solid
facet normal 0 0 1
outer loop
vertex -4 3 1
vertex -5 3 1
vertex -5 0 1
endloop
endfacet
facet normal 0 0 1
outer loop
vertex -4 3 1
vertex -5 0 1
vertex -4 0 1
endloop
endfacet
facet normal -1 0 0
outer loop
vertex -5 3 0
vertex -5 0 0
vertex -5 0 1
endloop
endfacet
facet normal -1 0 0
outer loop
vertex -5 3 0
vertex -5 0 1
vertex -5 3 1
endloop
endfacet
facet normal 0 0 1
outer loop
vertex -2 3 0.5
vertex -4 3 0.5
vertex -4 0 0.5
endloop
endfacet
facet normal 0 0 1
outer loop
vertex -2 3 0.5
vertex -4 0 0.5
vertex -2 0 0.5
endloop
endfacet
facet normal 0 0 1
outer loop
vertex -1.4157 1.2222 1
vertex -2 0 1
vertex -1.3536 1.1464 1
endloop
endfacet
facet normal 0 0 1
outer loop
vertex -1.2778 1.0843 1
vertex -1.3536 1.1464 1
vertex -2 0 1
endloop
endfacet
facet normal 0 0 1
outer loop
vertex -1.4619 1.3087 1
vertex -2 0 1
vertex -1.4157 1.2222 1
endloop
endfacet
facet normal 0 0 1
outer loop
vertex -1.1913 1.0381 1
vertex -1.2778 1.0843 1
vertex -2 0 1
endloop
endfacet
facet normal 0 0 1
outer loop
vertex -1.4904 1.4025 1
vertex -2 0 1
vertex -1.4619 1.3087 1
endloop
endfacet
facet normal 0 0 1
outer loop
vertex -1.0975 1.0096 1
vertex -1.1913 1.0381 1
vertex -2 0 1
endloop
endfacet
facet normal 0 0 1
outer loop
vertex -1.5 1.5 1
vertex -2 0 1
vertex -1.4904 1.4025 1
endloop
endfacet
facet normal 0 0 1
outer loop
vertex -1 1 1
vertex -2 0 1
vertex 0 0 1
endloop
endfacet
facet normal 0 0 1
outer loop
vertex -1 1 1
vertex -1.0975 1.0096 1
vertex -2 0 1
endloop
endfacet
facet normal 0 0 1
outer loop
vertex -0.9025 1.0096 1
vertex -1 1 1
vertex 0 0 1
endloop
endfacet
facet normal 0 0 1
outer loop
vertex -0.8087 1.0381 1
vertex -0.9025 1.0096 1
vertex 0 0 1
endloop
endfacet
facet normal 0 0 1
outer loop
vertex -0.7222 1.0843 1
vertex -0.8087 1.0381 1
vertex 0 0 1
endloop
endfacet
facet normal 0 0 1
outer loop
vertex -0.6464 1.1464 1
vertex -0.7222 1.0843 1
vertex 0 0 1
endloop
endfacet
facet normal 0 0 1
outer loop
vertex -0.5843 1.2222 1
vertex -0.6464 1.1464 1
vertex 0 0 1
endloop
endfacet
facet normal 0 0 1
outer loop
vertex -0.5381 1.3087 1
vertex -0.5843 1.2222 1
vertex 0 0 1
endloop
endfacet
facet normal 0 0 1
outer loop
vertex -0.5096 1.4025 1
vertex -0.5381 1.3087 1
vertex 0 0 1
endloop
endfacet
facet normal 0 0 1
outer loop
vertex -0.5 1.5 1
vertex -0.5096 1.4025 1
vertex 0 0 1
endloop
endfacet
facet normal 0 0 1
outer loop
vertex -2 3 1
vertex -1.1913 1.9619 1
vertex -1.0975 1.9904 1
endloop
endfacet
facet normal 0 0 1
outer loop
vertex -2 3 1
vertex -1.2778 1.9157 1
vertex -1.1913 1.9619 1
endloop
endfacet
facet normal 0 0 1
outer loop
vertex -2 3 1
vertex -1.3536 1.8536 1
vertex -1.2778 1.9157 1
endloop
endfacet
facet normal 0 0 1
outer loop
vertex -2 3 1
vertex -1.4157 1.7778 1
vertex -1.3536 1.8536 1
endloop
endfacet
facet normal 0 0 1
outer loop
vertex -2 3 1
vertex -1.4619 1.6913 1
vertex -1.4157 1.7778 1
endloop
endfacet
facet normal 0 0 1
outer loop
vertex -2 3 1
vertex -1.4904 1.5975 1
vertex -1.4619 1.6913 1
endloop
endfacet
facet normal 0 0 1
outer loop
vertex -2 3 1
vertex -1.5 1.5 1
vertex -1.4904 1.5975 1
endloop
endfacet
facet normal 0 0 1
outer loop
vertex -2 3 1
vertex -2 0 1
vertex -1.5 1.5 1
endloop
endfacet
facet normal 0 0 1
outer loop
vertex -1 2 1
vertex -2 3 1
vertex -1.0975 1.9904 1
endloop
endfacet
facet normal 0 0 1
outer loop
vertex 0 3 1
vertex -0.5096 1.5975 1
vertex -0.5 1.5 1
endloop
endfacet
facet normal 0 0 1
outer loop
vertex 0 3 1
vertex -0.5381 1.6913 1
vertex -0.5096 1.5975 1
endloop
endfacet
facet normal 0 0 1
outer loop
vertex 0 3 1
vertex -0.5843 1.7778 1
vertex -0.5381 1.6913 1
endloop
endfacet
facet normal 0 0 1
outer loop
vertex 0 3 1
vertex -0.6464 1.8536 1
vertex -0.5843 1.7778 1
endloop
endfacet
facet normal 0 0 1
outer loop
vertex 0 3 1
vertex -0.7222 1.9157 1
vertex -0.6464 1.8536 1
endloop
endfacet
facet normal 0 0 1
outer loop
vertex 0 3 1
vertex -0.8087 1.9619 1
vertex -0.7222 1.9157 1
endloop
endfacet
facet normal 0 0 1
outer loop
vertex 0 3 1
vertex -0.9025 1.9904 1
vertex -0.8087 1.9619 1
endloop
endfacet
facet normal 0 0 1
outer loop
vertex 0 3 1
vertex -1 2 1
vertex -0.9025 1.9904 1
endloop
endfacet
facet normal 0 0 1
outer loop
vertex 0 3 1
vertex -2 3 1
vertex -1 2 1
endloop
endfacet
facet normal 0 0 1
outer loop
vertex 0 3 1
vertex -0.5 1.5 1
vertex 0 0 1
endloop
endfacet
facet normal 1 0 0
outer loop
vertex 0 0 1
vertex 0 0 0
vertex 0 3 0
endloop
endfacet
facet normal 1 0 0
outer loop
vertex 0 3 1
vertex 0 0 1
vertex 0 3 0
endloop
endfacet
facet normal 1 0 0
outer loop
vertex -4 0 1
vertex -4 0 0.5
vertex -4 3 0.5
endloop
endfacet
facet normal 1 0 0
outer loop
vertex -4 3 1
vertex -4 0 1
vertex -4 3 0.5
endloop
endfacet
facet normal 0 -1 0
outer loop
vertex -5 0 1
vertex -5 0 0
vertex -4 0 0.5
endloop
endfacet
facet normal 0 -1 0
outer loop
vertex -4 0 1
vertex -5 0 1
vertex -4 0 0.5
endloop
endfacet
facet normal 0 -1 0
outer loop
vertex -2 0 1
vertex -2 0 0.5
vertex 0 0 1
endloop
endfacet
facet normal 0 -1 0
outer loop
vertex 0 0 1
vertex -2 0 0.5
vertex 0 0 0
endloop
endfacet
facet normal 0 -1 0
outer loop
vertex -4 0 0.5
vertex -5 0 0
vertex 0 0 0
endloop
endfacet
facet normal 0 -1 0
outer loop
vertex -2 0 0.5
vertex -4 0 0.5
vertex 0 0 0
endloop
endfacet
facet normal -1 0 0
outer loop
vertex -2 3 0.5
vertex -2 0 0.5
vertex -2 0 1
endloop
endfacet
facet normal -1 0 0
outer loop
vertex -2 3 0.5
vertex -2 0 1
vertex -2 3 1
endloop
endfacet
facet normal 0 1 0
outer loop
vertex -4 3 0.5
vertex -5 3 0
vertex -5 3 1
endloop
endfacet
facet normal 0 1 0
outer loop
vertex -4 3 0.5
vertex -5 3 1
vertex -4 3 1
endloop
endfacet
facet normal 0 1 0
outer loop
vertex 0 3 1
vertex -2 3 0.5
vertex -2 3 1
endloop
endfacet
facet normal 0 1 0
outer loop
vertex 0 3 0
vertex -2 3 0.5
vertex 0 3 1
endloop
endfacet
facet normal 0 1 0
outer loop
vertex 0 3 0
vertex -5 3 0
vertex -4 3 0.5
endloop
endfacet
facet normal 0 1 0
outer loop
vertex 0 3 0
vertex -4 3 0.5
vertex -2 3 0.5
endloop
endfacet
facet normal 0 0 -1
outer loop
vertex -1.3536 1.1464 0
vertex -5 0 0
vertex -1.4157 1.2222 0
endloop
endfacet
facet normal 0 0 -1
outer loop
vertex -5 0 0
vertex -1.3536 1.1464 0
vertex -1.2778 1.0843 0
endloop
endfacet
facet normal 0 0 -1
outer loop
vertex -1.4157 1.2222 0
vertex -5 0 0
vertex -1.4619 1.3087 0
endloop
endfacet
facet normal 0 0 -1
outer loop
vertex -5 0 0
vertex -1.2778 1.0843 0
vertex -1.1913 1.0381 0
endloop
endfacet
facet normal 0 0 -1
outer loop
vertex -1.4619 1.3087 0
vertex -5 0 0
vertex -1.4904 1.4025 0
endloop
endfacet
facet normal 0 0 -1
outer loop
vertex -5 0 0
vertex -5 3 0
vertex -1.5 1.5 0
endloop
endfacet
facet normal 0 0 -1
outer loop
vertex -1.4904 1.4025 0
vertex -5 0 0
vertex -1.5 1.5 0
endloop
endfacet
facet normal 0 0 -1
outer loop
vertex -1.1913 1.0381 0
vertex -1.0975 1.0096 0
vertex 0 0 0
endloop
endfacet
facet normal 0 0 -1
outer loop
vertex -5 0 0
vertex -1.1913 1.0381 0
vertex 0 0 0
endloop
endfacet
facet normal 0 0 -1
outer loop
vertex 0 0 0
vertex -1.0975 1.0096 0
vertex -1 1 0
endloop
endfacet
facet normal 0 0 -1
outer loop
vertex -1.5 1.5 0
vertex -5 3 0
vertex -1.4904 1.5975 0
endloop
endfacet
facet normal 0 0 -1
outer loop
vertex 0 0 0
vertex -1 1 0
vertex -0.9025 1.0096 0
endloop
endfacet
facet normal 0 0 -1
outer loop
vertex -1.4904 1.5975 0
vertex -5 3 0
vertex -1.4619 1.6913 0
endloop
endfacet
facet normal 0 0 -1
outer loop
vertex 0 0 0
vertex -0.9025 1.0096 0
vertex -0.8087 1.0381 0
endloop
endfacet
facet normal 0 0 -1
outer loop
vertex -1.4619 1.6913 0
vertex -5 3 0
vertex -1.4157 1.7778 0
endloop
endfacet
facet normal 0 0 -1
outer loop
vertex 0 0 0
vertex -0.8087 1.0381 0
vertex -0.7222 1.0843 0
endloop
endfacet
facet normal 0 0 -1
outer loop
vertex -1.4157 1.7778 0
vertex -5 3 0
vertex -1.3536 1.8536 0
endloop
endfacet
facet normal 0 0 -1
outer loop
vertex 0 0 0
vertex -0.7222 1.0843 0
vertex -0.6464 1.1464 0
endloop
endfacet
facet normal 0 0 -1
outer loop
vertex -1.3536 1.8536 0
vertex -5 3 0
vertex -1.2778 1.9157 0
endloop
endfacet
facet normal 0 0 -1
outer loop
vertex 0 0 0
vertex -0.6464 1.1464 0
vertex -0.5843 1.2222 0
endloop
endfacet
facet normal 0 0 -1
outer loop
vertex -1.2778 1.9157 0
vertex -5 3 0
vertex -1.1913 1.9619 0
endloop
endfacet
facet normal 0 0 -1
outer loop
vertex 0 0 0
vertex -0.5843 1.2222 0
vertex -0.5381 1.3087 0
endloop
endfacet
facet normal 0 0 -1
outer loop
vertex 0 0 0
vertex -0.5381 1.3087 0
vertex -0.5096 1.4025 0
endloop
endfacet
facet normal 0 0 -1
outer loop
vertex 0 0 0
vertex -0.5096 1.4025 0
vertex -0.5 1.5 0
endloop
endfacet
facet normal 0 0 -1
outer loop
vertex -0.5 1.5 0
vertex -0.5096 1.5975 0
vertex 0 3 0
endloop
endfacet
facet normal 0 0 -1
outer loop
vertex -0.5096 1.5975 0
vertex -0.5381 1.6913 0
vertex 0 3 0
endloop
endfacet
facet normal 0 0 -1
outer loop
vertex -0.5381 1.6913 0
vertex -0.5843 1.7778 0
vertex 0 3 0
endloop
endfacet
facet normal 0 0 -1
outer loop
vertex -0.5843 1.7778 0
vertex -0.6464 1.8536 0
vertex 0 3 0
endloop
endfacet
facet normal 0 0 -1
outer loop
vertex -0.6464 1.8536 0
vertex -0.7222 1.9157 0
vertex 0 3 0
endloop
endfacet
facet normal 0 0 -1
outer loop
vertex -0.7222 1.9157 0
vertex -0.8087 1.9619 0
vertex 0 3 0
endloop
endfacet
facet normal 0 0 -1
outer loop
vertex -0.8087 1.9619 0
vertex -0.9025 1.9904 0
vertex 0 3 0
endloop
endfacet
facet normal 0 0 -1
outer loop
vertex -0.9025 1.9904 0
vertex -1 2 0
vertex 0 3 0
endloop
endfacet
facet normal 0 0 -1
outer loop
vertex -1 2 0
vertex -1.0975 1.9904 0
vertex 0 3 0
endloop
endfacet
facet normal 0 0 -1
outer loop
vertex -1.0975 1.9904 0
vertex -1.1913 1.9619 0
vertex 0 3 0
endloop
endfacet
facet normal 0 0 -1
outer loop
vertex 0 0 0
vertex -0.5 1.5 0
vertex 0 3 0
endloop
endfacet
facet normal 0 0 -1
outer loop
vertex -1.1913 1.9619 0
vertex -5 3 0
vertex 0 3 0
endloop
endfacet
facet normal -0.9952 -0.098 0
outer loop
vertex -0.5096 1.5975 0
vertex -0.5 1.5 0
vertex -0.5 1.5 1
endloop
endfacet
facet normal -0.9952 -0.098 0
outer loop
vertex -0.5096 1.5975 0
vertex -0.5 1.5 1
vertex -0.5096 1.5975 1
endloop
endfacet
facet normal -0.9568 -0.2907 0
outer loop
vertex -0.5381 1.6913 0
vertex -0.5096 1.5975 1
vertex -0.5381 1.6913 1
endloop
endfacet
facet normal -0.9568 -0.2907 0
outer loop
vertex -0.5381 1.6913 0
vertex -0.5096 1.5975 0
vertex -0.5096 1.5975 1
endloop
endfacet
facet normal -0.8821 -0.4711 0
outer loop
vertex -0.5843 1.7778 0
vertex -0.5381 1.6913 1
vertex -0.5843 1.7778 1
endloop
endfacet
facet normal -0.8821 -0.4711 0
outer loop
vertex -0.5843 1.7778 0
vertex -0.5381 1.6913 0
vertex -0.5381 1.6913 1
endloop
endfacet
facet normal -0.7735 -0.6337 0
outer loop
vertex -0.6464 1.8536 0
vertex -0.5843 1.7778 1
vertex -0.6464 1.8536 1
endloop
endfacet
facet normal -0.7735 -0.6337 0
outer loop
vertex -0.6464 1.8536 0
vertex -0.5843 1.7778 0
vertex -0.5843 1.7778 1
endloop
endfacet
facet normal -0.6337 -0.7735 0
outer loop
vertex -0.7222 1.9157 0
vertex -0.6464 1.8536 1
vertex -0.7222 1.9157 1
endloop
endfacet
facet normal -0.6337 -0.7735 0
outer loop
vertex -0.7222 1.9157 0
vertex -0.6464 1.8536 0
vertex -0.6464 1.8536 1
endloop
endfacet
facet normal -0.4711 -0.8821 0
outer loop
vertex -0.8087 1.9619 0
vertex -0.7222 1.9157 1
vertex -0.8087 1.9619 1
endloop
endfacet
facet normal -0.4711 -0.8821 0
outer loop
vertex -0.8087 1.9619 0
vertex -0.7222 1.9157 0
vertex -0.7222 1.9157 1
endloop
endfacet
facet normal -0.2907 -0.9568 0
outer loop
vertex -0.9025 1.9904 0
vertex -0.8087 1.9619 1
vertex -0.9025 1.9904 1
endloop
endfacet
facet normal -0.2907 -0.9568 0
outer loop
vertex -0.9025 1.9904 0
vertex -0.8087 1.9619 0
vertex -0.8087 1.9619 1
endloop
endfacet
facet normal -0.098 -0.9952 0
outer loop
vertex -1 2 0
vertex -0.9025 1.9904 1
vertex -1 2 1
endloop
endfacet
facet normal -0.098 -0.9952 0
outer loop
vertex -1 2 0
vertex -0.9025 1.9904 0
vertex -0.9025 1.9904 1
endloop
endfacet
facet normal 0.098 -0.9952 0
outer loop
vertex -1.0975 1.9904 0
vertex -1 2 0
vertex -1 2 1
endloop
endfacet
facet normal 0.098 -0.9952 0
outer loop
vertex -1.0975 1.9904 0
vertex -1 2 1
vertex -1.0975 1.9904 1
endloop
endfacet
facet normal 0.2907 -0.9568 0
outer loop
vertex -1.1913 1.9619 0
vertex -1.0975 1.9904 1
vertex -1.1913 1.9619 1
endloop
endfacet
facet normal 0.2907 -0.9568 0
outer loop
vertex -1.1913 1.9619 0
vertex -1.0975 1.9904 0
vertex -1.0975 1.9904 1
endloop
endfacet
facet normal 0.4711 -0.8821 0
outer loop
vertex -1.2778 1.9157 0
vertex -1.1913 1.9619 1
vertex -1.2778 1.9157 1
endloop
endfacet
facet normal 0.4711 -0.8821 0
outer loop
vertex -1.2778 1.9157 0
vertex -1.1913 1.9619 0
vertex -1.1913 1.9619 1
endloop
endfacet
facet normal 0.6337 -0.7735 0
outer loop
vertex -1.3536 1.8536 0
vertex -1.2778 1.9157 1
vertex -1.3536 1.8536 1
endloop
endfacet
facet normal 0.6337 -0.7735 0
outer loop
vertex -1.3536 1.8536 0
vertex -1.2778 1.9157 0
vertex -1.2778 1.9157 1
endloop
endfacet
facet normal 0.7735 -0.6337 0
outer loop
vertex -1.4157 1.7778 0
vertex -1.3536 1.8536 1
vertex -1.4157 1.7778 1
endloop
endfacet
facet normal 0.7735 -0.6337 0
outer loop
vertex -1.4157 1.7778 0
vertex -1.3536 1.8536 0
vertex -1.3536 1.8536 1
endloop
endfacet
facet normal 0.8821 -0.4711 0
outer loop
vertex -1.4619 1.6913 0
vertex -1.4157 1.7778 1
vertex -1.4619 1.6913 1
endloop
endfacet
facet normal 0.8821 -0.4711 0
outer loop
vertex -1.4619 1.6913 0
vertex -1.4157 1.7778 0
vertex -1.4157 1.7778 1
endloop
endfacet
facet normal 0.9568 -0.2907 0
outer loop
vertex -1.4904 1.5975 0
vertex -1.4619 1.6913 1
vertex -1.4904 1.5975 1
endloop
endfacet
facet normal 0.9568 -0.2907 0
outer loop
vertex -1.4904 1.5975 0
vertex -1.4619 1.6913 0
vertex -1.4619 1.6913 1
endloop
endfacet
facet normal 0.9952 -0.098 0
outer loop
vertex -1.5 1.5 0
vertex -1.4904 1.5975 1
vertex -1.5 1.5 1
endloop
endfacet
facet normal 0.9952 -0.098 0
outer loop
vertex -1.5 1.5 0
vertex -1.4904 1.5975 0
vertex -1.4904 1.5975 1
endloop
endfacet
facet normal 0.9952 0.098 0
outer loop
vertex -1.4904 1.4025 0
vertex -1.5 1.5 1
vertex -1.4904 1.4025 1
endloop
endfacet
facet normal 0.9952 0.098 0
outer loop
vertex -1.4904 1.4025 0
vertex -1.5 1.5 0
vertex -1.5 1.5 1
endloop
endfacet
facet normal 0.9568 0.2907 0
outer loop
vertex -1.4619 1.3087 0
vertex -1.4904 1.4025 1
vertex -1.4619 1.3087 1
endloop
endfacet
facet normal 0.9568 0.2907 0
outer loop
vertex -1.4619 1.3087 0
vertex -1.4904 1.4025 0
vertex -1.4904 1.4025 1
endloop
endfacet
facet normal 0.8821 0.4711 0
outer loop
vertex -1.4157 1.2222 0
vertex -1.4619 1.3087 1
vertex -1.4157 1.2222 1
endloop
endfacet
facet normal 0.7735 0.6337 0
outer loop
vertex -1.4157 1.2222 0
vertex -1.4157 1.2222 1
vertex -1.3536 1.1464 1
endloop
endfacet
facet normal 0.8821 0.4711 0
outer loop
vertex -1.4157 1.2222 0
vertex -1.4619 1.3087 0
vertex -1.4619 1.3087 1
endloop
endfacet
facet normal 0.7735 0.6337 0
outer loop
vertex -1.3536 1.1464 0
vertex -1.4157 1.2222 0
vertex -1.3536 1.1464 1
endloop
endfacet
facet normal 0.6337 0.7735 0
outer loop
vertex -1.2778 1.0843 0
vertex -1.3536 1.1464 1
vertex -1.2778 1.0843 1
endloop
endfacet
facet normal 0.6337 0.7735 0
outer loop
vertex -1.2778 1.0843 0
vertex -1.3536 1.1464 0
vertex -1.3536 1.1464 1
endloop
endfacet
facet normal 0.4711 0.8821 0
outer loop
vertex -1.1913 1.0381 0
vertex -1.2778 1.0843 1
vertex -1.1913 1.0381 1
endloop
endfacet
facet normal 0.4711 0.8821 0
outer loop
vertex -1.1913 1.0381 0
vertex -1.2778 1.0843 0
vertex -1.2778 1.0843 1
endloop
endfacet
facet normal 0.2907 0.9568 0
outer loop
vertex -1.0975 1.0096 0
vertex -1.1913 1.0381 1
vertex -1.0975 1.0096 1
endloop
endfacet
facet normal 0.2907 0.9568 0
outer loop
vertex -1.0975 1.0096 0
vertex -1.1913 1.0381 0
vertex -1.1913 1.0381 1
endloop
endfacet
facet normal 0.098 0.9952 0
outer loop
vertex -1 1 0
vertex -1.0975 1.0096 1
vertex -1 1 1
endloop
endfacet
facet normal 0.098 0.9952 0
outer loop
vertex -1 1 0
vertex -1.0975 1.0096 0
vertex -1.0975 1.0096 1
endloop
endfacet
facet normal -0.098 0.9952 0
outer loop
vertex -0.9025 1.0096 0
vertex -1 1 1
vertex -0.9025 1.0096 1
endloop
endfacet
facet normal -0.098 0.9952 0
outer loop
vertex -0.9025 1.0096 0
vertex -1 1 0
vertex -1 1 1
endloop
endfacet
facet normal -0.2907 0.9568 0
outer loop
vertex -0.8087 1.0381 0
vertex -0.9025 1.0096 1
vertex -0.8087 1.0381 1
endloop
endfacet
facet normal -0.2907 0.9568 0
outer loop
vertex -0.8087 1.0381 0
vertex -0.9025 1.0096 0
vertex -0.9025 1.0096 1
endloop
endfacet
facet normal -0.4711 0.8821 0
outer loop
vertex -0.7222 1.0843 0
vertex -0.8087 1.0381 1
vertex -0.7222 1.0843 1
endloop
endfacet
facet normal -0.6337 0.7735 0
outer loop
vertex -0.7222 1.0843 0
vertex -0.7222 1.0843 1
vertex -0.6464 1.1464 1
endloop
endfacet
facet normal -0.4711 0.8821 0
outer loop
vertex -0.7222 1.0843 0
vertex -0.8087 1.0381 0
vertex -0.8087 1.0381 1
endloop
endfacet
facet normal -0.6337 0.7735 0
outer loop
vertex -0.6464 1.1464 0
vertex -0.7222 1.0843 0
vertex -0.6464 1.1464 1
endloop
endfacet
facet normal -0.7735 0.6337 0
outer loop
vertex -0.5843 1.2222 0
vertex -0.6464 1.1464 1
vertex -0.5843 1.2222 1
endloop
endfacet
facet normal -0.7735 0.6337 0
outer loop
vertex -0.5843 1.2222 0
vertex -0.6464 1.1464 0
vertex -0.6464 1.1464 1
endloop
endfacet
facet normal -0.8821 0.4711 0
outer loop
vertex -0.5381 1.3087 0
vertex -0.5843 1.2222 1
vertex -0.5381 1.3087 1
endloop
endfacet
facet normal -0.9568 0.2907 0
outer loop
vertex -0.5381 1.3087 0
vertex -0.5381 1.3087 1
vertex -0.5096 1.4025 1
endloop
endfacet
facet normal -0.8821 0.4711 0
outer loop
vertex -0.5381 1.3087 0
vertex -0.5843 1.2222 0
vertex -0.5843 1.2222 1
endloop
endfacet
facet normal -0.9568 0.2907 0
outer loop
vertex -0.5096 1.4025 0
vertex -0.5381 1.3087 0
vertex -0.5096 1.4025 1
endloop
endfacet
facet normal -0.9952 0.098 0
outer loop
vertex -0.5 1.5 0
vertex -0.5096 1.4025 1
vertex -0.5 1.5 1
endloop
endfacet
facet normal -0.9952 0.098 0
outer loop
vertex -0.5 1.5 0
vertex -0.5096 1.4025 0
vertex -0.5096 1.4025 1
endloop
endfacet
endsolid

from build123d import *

# Parameters (mm, degrees)
F0_W     = 1
F0_H     = 3
F1_DEPTH = 1
F0_W_2   = 2
F2_DEPTH = 0.5
F0_R     = 0.5
F3_DEPTH = 1


with BuildPart() as f1:
    # F0 (on Top) → F1 (new body)
    with BuildSketch(Plane.XY):
        with Locations((-4.5, 1.5)):
            Rectangle(F0_W, F0_H)
    extrude(amount=F1_DEPTH)

    # F0 (on Top) → F2 (join)
    with BuildSketch(Plane.XY):
        with Locations((-3, 1.5)):
            Rectangle(F0_W_2, F0_H)
    extrude(amount=F2_DEPTH)

    # F0 (on Top) → F3 (join)
    with BuildSketch(Plane.XY):
        with Locations((-1, 1.5)):
            Rectangle(F0_W_2, F0_H)
        with Locations((-1, 1.5)):
            Circle(F0_R, mode=Mode.SUBTRACT)
    extrude(amount=F3_DEPTH)


solid = f1.part
